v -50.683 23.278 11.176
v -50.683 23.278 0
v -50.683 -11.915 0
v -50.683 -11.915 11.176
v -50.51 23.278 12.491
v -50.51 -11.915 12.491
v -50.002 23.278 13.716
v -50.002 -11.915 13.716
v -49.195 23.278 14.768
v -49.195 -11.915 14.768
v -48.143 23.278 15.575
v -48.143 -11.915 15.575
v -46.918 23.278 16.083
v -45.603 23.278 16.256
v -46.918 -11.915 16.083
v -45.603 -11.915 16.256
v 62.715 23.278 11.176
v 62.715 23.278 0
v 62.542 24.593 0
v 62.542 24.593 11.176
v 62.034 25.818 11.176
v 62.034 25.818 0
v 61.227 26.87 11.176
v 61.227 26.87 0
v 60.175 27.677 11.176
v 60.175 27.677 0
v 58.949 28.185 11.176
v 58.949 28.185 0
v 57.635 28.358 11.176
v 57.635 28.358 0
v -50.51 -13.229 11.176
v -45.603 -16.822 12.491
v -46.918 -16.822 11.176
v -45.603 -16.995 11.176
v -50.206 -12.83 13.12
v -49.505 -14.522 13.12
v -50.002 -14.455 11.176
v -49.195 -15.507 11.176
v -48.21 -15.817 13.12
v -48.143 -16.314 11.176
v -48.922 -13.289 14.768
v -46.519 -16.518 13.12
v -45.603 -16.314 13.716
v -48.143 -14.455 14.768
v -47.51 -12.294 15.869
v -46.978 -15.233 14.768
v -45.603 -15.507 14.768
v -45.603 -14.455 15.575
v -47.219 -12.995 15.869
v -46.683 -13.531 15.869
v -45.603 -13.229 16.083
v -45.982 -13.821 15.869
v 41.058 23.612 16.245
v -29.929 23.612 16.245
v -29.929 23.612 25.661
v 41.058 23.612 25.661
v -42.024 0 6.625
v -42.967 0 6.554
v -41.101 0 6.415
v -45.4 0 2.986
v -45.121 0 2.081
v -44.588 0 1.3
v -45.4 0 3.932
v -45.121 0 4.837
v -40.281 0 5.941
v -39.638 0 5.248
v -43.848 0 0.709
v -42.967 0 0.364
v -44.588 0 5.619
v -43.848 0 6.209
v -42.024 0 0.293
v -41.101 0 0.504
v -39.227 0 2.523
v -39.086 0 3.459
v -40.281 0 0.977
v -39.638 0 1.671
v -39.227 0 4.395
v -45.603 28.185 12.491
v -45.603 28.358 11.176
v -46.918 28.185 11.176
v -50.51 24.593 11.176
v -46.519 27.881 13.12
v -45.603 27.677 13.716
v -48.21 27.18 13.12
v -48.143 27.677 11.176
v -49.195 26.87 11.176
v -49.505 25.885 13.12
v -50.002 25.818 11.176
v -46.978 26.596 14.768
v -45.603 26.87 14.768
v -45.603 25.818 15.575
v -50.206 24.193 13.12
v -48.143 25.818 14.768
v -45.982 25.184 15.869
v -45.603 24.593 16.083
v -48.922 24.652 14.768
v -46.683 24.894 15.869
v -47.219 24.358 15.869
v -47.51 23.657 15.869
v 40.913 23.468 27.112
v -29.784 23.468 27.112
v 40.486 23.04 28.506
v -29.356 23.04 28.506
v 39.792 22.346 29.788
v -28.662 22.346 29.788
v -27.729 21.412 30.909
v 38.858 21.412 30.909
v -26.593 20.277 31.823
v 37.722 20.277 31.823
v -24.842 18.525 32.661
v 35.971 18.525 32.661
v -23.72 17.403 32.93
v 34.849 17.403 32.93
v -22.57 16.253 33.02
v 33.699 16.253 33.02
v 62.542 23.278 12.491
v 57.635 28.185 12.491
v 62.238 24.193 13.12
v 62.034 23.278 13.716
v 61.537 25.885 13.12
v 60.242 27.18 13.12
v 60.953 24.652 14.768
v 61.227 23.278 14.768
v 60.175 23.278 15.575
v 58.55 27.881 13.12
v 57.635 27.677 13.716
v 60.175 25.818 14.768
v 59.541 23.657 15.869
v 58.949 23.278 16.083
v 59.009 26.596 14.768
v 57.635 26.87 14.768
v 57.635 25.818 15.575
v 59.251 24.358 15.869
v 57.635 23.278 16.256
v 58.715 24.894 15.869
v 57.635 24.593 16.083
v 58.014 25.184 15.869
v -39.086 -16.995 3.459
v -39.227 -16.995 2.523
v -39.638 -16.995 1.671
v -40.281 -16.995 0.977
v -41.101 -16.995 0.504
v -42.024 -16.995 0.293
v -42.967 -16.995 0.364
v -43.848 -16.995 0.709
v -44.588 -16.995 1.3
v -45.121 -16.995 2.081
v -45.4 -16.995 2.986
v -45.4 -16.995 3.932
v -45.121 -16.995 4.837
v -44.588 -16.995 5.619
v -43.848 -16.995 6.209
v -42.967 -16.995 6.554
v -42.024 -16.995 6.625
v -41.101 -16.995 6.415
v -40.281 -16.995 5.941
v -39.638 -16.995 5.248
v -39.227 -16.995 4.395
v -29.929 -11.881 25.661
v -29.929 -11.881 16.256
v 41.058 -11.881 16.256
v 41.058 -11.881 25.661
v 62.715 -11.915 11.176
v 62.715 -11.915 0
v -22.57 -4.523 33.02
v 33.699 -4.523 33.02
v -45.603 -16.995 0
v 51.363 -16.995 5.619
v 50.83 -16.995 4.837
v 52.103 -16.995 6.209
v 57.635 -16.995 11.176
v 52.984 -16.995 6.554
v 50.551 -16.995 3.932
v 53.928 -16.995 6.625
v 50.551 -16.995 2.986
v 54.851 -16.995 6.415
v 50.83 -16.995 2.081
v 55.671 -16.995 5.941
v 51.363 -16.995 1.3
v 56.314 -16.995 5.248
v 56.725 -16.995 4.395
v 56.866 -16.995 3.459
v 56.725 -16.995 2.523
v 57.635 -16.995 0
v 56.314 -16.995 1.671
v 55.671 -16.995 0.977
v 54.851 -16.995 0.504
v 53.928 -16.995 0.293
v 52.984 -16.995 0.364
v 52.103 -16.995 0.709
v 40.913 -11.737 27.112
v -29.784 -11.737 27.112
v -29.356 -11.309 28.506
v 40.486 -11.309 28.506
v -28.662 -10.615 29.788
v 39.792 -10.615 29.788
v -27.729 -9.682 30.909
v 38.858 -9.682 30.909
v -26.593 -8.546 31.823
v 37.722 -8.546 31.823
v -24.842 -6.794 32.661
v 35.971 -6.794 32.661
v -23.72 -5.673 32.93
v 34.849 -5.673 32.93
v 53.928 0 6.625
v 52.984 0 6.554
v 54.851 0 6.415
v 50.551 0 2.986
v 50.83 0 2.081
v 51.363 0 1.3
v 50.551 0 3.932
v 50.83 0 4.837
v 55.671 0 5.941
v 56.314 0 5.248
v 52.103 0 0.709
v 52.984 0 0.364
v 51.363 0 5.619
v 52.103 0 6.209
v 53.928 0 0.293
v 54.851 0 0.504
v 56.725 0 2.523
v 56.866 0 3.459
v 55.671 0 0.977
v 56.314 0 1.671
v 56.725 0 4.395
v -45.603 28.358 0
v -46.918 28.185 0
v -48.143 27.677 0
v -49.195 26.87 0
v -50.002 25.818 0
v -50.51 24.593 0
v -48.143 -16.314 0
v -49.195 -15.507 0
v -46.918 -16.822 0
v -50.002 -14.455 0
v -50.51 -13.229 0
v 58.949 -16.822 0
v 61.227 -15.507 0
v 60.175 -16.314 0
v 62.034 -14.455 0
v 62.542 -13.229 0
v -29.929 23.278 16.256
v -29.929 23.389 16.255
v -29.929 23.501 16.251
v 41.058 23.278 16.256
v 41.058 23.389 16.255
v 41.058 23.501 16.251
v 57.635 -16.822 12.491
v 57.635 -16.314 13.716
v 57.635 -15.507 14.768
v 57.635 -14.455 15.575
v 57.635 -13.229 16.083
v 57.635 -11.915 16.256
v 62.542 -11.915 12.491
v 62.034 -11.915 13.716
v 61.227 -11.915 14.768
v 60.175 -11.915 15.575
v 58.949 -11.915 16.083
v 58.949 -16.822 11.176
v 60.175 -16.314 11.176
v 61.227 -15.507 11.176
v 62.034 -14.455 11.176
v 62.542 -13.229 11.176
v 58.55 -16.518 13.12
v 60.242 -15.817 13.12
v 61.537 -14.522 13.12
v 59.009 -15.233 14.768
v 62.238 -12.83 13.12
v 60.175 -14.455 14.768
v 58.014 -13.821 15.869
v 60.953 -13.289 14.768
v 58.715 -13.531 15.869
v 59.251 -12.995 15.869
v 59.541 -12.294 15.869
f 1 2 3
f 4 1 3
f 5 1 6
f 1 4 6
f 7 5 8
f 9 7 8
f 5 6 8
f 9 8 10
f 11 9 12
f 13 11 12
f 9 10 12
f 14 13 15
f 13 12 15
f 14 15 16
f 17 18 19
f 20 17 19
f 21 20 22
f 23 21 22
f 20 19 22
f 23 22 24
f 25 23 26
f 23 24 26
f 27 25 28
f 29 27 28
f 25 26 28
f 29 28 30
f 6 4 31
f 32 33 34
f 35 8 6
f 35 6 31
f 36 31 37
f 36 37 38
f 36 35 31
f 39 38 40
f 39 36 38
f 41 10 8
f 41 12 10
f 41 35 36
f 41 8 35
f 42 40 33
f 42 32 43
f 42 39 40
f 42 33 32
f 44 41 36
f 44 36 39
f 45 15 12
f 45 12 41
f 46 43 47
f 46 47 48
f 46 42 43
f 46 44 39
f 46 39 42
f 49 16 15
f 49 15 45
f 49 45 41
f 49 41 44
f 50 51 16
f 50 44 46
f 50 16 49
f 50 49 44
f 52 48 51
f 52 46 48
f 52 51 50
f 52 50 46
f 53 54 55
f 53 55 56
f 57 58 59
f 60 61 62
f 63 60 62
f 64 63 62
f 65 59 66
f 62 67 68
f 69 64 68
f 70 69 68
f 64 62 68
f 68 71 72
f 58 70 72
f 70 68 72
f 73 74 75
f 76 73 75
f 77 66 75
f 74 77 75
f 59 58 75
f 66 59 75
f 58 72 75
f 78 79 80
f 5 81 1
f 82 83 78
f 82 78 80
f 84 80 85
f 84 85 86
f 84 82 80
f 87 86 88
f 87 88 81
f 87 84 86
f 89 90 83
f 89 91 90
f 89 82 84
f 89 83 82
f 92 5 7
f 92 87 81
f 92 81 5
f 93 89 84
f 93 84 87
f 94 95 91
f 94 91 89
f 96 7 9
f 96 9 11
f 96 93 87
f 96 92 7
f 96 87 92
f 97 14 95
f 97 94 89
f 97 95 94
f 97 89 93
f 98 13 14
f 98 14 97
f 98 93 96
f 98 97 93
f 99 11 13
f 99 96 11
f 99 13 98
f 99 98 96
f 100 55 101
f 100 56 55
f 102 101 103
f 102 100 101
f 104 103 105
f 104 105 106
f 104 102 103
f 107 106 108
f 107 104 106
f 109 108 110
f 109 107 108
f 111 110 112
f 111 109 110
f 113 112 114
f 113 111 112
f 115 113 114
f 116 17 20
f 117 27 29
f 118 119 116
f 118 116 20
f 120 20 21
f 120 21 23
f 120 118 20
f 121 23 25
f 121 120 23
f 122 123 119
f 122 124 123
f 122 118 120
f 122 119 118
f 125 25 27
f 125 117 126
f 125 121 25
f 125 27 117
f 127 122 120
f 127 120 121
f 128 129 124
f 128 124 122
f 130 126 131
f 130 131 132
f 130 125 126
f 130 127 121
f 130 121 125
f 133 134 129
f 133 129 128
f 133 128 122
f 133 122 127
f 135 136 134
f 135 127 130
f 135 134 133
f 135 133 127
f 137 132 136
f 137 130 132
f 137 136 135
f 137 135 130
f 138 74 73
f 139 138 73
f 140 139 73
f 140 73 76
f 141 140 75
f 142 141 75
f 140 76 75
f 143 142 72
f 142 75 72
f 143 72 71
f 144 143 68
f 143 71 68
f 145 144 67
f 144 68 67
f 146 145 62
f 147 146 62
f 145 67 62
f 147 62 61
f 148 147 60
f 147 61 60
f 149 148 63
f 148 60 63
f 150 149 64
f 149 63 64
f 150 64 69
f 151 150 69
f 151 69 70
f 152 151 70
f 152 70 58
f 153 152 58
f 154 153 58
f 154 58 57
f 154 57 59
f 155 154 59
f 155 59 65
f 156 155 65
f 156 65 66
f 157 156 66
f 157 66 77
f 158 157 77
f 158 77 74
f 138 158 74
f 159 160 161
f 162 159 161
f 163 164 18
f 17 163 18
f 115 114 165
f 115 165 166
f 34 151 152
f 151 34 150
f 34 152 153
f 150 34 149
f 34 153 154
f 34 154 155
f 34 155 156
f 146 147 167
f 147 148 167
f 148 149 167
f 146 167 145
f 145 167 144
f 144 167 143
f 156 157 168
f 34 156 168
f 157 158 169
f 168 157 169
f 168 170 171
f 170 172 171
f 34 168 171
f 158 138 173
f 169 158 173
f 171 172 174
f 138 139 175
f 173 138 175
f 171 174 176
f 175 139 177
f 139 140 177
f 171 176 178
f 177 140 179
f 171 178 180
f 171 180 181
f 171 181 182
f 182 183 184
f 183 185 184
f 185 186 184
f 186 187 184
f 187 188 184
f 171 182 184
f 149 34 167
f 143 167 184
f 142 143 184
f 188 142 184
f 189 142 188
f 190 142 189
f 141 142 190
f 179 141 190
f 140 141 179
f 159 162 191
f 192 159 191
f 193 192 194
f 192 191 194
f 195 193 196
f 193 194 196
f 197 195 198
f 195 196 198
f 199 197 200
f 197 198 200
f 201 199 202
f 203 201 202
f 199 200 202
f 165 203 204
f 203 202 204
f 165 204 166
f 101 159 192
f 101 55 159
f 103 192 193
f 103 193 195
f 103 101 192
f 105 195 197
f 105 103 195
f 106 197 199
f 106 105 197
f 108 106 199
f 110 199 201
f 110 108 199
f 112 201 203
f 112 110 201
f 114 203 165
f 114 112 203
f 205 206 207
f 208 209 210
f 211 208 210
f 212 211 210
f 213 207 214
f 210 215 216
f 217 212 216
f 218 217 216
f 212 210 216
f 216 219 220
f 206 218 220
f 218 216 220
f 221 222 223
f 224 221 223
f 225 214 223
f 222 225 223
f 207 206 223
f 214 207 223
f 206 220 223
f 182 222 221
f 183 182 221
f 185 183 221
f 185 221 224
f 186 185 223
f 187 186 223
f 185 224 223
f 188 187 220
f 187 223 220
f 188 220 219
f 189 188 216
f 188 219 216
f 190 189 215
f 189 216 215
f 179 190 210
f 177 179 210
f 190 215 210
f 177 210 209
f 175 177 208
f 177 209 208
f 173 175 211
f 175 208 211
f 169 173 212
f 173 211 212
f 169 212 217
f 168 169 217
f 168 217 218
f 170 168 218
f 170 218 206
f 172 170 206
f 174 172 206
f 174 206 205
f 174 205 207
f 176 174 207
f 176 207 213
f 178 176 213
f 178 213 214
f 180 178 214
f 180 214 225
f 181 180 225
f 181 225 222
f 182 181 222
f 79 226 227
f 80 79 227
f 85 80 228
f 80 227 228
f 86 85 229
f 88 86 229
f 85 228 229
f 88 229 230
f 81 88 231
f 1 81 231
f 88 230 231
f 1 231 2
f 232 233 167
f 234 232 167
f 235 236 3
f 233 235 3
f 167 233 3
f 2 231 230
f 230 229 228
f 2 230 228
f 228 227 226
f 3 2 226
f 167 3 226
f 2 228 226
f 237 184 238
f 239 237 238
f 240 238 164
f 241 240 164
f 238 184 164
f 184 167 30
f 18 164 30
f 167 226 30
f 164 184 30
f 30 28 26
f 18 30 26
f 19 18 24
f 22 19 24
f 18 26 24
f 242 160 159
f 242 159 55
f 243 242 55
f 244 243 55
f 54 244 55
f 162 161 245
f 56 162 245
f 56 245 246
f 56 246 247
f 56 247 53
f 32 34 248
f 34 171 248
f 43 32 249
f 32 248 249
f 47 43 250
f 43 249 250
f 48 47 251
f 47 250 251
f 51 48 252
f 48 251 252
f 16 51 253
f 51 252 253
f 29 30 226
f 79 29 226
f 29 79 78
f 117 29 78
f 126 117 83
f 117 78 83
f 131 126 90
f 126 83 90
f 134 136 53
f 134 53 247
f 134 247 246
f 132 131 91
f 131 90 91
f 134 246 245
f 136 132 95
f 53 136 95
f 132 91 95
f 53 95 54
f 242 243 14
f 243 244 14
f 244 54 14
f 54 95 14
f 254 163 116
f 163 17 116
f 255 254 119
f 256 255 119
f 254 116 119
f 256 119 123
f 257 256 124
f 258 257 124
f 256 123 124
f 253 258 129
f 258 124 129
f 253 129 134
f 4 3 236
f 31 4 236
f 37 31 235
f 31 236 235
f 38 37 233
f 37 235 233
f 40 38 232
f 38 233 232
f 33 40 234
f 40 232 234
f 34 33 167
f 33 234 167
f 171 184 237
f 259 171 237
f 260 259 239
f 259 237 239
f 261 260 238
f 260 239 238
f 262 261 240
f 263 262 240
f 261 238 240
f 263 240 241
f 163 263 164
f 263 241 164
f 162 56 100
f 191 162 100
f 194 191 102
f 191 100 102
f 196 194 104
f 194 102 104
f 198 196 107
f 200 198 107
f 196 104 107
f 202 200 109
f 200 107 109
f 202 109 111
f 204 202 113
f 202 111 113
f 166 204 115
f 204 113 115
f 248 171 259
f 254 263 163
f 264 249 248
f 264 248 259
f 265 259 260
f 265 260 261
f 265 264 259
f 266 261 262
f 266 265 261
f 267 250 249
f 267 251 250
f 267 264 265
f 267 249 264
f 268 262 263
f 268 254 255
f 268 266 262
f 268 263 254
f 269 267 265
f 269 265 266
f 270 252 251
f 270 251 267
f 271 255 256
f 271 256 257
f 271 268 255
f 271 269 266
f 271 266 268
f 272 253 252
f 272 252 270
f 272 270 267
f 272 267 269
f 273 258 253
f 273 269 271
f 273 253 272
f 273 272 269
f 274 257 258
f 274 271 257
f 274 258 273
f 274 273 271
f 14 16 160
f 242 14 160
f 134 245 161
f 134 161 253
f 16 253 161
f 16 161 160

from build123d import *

# Parameters (mm, degrees)
F1_DEPTH = 16.256
F2_R     = 5.08
F3_W     = 70.9863193333
F3_H     = 35.4931587353
F4_DEPTH = 33.02
F5_R     = 7.3585229381
F7_D     = 6.35
F7_DEPTH = 16.9956048409


with BuildPart() as f1:
    # F0 (on Top) → F1 (new body)
    with BuildSketch(Plane.XY):
        with BuildLine():
            Line((57.6345990729, 28.3577627349), (-45.6030252707, 28.3577627349))
            ThreePointArc((-45.6030252707, 28.3577627349), (-49.1951277191, 26.8698651833), (-50.6830252707, 23.2777627349))
            Line((-50.6830252707, 23.2777627349), (-50.6830252707, -11.9146048409))
            ThreePointArc((-50.6830252707, -11.9146048409), (-49.1951277191, -15.5067072893), (-45.6030252707, -16.9946048409))
            Line((-45.6030252707, -16.9946048409), (57.6345990729, -16.9946048409))
            ThreePointArc((57.6345990729, -16.9946048409), (61.2267015214, -15.5067072893), (62.7145990729, -11.9146048409))
            Line((62.7145990729, -11.9146048409), (62.7145990729, 23.2777627349))
            ThreePointArc((62.7145990729, 23.2777627349), (61.2267015214, 26.8698651833), (57.6345990729, 28.3577627349))
        make_face()
    extrude(amount=F1_DEPTH)

    # F2
    f2_edges = [f1.edges().sort_by_distance(p)[0] for p in [
        (-49.195128, -15.506707, 16.256),
    ]]
    fillet(f2_edges, radius=F2_R)

    # F3 (on Top) → F4 (join)
    with BuildSketch(Plane.XY):
        with Locations((5.5646058172, 5.8653946035)):
            Rectangle(F3_W, F3_H)
    extrude(amount=F4_DEPTH)

    # F5
    f5_edges = [f1.edges().sort_by_distance(p)[0] for p in [
        (5.564606, 23.611974, 33.02),
        (-29.928554, 5.865395, 33.02),
        (5.564606, -11.881185, 33.02),
        (41.057765, 5.865395, 33.02),
    ]]
    fillet(f5_edges, radius=F5_R)

    # F7 (through all, one way)
    with BuildSketch(Plane(origin=(0, 0, 0), x_dir=(1, 0, 0), z_dir=(0, 1, 0))):
        with Locations((53.6909215152, -3.4590789583), (-42.2609224916, -3.4590789583)):
            Circle(F7_D / 2)
    extrude(amount=-F7_DEPTH, mode=Mode.SUBTRACT)


solid = f1.part
